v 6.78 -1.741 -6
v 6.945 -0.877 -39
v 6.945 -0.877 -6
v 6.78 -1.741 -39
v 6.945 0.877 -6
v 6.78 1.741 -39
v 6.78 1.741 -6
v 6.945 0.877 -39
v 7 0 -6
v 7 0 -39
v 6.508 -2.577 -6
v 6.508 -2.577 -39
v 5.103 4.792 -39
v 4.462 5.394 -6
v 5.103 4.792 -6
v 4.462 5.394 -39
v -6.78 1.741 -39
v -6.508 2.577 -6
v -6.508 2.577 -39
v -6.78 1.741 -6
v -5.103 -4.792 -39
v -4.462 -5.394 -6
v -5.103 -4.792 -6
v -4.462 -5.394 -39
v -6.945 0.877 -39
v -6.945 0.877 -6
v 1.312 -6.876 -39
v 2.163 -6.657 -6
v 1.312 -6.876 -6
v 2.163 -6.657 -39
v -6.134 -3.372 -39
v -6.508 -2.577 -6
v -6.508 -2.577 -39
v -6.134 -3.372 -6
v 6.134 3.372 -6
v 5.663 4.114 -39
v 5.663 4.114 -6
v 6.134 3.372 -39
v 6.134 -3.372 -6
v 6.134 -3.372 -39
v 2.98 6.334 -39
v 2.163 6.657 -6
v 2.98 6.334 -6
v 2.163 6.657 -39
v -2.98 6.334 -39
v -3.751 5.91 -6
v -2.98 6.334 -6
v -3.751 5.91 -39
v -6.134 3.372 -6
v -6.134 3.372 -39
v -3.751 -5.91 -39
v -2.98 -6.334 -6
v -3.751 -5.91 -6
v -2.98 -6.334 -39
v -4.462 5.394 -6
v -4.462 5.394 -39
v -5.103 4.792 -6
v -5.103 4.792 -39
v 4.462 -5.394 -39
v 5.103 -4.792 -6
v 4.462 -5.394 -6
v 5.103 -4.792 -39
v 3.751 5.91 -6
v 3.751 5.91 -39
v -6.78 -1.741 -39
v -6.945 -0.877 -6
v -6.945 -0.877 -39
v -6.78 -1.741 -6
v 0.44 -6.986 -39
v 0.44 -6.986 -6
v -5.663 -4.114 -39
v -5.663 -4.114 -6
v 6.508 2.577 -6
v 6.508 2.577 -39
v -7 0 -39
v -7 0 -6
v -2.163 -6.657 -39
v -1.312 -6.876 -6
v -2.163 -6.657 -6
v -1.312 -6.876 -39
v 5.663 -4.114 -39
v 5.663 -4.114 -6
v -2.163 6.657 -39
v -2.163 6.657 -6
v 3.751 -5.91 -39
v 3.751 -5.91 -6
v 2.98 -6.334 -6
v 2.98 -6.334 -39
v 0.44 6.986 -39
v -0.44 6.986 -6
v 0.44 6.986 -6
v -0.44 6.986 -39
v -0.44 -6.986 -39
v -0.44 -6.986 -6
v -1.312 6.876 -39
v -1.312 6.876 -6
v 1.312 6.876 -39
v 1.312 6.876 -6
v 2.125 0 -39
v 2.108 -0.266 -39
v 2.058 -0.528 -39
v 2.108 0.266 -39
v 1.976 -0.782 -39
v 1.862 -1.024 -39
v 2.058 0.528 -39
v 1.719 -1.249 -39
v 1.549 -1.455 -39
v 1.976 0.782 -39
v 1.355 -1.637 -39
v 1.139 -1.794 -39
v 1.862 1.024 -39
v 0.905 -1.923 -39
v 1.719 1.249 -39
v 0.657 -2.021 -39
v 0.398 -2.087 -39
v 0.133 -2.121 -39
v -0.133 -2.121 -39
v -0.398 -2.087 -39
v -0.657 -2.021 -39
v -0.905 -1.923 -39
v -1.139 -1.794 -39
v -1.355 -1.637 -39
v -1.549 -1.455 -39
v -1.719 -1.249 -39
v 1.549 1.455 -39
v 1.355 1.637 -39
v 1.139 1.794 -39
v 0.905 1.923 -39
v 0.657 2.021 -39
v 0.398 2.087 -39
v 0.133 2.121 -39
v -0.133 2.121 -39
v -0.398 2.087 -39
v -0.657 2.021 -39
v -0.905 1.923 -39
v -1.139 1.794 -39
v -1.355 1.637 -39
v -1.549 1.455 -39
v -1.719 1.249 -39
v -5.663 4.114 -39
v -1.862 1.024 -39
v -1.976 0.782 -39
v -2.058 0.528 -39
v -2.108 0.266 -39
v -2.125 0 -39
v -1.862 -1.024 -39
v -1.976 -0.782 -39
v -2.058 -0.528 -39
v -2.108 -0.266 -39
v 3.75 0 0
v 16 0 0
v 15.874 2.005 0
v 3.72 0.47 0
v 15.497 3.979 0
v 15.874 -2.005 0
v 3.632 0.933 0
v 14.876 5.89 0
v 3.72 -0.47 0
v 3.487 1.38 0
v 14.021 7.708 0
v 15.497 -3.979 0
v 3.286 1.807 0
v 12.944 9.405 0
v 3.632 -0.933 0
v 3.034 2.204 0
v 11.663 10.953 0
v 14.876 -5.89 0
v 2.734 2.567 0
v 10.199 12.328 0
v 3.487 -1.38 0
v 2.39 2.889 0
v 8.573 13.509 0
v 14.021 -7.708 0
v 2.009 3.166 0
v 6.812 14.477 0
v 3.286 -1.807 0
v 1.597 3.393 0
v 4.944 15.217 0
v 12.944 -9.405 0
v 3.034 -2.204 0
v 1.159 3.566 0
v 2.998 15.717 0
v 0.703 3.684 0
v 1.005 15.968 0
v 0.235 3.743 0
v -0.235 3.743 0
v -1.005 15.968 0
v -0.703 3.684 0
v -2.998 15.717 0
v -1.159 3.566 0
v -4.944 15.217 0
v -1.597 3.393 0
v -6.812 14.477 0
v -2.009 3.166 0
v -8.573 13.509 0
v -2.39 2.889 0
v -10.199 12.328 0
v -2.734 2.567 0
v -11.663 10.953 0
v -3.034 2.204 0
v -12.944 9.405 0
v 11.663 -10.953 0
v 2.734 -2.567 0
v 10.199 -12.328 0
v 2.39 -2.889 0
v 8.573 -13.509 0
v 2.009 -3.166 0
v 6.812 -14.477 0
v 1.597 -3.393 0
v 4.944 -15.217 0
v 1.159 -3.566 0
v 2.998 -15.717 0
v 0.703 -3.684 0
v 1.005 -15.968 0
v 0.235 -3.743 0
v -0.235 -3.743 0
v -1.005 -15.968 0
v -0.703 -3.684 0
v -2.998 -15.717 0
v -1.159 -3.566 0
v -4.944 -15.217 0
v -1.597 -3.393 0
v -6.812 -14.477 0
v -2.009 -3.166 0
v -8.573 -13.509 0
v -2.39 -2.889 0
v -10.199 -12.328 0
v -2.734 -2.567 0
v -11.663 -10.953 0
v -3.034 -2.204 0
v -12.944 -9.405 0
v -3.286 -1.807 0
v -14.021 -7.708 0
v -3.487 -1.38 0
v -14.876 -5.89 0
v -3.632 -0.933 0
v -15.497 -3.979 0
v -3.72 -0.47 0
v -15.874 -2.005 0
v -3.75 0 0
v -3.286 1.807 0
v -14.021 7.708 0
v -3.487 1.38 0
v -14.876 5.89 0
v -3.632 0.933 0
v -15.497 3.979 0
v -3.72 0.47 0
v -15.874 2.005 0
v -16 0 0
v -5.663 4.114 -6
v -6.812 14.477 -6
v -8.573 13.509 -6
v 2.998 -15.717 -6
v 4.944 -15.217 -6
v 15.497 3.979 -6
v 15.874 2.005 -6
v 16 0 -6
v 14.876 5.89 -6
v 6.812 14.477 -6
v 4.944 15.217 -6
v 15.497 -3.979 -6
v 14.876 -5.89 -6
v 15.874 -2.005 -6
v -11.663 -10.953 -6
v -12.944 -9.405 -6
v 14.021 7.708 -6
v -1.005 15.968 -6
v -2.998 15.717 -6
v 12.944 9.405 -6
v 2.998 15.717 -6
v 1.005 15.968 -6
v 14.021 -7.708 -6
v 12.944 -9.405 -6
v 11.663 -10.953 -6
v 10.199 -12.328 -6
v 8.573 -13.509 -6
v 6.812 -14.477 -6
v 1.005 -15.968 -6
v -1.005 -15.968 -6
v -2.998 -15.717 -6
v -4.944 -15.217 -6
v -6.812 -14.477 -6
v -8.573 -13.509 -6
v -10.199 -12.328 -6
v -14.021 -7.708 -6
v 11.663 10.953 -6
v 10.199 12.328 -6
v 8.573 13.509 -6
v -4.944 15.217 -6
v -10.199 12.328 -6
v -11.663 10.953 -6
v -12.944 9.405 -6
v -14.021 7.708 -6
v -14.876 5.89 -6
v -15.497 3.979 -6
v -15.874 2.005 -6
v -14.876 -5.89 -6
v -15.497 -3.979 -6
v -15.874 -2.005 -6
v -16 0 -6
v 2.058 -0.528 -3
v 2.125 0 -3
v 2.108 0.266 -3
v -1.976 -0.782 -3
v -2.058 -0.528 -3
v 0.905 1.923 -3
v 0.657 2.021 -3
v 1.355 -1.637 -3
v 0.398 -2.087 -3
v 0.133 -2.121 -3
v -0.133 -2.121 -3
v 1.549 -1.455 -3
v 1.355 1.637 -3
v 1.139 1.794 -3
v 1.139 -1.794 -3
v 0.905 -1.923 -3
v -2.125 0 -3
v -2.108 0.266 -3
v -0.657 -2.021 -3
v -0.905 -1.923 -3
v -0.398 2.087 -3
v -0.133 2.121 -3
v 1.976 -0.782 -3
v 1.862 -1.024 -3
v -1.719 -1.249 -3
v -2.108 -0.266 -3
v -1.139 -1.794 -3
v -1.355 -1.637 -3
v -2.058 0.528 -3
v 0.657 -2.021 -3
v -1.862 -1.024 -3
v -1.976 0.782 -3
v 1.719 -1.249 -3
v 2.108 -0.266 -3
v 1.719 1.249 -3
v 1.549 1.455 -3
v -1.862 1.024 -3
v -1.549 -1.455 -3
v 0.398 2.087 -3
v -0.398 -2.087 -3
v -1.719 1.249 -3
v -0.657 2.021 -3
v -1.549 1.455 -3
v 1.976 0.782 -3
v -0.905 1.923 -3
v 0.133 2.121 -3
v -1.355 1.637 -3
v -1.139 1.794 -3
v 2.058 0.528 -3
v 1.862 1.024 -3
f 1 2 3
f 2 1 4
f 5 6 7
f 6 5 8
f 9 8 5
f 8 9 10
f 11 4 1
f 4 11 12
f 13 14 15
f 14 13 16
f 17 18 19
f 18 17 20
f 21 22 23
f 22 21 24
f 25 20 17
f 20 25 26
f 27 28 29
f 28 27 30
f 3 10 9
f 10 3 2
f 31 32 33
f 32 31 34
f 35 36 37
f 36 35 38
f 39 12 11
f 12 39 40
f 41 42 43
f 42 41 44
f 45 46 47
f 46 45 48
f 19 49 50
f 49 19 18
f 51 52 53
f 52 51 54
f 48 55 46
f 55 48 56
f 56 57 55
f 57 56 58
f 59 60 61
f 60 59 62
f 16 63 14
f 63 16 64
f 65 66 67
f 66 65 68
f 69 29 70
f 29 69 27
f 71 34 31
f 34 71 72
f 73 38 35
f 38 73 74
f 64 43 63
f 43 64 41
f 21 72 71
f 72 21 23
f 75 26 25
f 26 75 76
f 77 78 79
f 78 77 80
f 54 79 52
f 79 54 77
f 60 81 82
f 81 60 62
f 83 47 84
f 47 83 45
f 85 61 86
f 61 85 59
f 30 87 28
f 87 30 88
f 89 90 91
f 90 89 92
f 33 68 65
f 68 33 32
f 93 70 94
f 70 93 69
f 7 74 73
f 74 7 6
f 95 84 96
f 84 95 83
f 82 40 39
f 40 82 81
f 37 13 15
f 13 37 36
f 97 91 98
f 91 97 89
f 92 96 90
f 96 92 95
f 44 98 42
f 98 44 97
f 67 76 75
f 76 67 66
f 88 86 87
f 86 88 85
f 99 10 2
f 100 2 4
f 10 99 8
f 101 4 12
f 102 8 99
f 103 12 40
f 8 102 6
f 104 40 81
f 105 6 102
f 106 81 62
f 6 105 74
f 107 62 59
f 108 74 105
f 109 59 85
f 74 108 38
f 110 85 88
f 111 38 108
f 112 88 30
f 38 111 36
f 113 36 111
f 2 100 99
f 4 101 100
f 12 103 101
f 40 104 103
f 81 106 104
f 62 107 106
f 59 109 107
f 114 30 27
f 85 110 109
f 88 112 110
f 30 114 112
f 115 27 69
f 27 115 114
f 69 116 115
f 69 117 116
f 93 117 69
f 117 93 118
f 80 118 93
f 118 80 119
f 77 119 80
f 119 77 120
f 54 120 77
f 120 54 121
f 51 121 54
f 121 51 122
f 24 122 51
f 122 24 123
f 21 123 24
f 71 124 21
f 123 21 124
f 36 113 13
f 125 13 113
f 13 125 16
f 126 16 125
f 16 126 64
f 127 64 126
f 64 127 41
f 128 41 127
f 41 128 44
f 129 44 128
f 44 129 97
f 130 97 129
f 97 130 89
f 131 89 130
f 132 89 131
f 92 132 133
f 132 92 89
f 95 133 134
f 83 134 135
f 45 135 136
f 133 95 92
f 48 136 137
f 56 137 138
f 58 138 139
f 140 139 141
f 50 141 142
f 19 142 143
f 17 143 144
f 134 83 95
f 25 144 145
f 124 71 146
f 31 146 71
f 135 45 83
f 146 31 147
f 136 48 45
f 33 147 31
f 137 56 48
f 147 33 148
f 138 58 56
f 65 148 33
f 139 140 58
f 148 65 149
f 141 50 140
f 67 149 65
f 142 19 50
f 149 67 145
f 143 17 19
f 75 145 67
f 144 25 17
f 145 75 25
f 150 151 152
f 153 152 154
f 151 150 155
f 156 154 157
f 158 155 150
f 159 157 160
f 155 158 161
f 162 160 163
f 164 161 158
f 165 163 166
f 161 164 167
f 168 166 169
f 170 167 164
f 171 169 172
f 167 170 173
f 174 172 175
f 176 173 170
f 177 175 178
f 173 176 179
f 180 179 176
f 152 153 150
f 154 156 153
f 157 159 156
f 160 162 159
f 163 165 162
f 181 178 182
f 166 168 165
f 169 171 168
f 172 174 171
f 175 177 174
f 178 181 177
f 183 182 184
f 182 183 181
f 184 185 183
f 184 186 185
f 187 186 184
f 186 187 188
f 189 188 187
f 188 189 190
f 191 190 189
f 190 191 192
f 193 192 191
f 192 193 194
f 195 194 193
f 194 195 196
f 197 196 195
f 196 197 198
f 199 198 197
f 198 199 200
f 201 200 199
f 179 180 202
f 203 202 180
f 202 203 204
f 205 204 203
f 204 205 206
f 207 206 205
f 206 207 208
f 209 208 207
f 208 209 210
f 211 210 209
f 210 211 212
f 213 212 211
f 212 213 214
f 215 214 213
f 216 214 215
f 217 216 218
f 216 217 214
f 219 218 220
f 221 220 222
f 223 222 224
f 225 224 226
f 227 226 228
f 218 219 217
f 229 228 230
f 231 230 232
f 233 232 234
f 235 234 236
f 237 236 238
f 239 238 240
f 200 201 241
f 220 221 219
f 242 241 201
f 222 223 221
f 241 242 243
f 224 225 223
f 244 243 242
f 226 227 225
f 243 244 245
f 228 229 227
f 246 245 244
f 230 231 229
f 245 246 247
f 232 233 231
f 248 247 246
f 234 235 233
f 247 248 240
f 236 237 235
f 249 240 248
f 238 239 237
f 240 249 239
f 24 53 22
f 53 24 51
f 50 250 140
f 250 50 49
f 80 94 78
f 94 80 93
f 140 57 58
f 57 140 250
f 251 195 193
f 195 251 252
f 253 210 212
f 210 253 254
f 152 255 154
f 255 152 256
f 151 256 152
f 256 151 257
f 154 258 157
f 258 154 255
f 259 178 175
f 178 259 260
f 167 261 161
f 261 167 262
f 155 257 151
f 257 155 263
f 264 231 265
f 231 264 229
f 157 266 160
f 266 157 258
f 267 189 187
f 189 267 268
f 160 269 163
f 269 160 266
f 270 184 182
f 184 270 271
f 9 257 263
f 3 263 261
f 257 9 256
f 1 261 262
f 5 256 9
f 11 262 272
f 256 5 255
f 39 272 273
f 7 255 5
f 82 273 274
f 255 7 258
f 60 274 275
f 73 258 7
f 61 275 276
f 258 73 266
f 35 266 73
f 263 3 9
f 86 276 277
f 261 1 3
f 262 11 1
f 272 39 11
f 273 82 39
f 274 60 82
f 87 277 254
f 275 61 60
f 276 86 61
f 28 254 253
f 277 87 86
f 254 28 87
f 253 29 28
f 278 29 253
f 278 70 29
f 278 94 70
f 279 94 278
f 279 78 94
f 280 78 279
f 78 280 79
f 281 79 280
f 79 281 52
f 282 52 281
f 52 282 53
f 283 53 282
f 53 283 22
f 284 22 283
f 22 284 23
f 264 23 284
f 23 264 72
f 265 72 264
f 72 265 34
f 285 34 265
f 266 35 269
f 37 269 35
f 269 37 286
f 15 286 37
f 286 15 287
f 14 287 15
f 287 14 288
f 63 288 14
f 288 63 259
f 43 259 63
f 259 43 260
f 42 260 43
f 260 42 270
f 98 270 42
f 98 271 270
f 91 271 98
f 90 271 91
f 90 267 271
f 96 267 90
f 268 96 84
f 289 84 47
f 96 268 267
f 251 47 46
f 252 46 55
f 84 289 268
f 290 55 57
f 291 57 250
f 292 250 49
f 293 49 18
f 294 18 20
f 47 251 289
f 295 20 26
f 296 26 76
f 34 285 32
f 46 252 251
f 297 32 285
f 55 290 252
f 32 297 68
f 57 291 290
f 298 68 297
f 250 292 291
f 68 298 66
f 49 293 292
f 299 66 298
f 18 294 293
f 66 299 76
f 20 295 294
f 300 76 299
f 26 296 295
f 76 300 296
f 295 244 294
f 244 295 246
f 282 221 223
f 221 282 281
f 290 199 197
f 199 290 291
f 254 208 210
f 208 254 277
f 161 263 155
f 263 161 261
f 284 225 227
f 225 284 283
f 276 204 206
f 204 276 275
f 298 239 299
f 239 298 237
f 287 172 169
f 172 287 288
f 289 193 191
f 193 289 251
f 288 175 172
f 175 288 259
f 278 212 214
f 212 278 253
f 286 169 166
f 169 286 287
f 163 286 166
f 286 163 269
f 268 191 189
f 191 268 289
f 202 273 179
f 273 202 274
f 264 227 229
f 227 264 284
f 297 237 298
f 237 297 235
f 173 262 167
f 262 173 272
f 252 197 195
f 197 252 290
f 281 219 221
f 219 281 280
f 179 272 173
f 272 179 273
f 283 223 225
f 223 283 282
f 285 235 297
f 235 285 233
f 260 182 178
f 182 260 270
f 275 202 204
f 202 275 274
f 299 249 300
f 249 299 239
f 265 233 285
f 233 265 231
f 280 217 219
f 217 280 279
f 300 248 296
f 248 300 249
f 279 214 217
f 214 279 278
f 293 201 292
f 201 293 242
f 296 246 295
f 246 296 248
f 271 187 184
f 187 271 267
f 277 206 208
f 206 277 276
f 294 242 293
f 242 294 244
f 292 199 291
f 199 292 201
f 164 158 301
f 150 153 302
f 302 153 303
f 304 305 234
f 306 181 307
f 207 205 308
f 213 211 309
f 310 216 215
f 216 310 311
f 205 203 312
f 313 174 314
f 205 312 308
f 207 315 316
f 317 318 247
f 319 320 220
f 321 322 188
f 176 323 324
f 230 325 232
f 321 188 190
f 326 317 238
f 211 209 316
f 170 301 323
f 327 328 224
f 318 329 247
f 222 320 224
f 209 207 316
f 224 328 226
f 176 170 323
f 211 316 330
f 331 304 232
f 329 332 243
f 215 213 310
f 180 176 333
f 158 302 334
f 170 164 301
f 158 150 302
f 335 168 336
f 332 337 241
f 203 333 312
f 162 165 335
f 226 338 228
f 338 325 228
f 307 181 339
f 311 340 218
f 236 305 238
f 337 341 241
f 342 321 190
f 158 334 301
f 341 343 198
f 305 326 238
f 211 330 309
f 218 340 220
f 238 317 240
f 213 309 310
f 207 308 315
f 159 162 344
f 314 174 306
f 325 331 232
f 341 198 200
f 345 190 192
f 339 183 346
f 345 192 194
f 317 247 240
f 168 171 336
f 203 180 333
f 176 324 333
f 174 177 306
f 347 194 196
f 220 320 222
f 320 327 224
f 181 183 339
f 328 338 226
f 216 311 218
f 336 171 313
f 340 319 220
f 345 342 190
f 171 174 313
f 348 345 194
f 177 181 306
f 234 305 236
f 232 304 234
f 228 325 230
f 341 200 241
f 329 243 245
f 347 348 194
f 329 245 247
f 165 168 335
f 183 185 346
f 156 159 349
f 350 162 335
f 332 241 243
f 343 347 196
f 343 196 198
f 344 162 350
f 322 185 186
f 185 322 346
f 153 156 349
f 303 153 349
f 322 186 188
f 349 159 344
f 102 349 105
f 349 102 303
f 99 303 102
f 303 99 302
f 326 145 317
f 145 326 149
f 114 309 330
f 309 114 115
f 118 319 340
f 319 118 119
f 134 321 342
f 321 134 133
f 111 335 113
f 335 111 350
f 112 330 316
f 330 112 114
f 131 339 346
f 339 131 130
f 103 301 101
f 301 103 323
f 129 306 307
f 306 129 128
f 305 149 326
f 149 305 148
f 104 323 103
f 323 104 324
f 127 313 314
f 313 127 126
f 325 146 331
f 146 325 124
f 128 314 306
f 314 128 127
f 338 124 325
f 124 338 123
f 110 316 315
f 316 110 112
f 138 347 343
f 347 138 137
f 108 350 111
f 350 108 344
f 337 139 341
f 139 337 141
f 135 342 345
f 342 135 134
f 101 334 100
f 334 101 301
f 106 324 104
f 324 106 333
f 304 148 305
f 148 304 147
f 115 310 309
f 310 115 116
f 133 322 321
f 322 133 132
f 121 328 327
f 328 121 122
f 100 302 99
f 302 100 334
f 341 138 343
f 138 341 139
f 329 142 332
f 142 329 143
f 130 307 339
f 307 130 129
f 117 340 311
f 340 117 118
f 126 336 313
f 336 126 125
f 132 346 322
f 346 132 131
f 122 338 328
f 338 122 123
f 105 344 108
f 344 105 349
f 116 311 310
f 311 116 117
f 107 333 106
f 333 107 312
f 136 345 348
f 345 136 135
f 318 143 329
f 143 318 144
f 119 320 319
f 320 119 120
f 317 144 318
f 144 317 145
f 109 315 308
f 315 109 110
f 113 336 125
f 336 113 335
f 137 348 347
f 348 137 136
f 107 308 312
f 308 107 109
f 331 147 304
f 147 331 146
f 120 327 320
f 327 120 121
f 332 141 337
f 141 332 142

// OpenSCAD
$fn = 50;


difference() {
	union() {
		translate(v = [0, 0, -39.0000000000]) {
			cylinder(h = 39, r = 7.0000000000);
		}
		translate(v = [0, 0, -6.0000000000]) {
			cylinder(h = 6, r = 16.0000000000);
		}
	}
	union() {
		translate(v = [0, 0, 0]) {
			rotate(a = [0, 0, 0]) {
				difference() {
					union() {
						#translate(v = [0, 0, -39.0000000000]) {
							cylinder(h = 39, r = 2.0000000000);
						}
						#translate(v = [0, 0, -3]) {
							cylinder(h = 3, r1 = 2.1250000000, r2 = 3.7500000000);
						}
						#translate(v = [0, 0, -39.0000000000]) {
							cylinder(h = 39, r = 2.1250000000);
						}
						#translate(v = [0, 0, -39.0000000000]) {
							cylinder(h = 39, r = 2.0000000000);
						}
					}
					union();
				}
			}
		}
	}
}
